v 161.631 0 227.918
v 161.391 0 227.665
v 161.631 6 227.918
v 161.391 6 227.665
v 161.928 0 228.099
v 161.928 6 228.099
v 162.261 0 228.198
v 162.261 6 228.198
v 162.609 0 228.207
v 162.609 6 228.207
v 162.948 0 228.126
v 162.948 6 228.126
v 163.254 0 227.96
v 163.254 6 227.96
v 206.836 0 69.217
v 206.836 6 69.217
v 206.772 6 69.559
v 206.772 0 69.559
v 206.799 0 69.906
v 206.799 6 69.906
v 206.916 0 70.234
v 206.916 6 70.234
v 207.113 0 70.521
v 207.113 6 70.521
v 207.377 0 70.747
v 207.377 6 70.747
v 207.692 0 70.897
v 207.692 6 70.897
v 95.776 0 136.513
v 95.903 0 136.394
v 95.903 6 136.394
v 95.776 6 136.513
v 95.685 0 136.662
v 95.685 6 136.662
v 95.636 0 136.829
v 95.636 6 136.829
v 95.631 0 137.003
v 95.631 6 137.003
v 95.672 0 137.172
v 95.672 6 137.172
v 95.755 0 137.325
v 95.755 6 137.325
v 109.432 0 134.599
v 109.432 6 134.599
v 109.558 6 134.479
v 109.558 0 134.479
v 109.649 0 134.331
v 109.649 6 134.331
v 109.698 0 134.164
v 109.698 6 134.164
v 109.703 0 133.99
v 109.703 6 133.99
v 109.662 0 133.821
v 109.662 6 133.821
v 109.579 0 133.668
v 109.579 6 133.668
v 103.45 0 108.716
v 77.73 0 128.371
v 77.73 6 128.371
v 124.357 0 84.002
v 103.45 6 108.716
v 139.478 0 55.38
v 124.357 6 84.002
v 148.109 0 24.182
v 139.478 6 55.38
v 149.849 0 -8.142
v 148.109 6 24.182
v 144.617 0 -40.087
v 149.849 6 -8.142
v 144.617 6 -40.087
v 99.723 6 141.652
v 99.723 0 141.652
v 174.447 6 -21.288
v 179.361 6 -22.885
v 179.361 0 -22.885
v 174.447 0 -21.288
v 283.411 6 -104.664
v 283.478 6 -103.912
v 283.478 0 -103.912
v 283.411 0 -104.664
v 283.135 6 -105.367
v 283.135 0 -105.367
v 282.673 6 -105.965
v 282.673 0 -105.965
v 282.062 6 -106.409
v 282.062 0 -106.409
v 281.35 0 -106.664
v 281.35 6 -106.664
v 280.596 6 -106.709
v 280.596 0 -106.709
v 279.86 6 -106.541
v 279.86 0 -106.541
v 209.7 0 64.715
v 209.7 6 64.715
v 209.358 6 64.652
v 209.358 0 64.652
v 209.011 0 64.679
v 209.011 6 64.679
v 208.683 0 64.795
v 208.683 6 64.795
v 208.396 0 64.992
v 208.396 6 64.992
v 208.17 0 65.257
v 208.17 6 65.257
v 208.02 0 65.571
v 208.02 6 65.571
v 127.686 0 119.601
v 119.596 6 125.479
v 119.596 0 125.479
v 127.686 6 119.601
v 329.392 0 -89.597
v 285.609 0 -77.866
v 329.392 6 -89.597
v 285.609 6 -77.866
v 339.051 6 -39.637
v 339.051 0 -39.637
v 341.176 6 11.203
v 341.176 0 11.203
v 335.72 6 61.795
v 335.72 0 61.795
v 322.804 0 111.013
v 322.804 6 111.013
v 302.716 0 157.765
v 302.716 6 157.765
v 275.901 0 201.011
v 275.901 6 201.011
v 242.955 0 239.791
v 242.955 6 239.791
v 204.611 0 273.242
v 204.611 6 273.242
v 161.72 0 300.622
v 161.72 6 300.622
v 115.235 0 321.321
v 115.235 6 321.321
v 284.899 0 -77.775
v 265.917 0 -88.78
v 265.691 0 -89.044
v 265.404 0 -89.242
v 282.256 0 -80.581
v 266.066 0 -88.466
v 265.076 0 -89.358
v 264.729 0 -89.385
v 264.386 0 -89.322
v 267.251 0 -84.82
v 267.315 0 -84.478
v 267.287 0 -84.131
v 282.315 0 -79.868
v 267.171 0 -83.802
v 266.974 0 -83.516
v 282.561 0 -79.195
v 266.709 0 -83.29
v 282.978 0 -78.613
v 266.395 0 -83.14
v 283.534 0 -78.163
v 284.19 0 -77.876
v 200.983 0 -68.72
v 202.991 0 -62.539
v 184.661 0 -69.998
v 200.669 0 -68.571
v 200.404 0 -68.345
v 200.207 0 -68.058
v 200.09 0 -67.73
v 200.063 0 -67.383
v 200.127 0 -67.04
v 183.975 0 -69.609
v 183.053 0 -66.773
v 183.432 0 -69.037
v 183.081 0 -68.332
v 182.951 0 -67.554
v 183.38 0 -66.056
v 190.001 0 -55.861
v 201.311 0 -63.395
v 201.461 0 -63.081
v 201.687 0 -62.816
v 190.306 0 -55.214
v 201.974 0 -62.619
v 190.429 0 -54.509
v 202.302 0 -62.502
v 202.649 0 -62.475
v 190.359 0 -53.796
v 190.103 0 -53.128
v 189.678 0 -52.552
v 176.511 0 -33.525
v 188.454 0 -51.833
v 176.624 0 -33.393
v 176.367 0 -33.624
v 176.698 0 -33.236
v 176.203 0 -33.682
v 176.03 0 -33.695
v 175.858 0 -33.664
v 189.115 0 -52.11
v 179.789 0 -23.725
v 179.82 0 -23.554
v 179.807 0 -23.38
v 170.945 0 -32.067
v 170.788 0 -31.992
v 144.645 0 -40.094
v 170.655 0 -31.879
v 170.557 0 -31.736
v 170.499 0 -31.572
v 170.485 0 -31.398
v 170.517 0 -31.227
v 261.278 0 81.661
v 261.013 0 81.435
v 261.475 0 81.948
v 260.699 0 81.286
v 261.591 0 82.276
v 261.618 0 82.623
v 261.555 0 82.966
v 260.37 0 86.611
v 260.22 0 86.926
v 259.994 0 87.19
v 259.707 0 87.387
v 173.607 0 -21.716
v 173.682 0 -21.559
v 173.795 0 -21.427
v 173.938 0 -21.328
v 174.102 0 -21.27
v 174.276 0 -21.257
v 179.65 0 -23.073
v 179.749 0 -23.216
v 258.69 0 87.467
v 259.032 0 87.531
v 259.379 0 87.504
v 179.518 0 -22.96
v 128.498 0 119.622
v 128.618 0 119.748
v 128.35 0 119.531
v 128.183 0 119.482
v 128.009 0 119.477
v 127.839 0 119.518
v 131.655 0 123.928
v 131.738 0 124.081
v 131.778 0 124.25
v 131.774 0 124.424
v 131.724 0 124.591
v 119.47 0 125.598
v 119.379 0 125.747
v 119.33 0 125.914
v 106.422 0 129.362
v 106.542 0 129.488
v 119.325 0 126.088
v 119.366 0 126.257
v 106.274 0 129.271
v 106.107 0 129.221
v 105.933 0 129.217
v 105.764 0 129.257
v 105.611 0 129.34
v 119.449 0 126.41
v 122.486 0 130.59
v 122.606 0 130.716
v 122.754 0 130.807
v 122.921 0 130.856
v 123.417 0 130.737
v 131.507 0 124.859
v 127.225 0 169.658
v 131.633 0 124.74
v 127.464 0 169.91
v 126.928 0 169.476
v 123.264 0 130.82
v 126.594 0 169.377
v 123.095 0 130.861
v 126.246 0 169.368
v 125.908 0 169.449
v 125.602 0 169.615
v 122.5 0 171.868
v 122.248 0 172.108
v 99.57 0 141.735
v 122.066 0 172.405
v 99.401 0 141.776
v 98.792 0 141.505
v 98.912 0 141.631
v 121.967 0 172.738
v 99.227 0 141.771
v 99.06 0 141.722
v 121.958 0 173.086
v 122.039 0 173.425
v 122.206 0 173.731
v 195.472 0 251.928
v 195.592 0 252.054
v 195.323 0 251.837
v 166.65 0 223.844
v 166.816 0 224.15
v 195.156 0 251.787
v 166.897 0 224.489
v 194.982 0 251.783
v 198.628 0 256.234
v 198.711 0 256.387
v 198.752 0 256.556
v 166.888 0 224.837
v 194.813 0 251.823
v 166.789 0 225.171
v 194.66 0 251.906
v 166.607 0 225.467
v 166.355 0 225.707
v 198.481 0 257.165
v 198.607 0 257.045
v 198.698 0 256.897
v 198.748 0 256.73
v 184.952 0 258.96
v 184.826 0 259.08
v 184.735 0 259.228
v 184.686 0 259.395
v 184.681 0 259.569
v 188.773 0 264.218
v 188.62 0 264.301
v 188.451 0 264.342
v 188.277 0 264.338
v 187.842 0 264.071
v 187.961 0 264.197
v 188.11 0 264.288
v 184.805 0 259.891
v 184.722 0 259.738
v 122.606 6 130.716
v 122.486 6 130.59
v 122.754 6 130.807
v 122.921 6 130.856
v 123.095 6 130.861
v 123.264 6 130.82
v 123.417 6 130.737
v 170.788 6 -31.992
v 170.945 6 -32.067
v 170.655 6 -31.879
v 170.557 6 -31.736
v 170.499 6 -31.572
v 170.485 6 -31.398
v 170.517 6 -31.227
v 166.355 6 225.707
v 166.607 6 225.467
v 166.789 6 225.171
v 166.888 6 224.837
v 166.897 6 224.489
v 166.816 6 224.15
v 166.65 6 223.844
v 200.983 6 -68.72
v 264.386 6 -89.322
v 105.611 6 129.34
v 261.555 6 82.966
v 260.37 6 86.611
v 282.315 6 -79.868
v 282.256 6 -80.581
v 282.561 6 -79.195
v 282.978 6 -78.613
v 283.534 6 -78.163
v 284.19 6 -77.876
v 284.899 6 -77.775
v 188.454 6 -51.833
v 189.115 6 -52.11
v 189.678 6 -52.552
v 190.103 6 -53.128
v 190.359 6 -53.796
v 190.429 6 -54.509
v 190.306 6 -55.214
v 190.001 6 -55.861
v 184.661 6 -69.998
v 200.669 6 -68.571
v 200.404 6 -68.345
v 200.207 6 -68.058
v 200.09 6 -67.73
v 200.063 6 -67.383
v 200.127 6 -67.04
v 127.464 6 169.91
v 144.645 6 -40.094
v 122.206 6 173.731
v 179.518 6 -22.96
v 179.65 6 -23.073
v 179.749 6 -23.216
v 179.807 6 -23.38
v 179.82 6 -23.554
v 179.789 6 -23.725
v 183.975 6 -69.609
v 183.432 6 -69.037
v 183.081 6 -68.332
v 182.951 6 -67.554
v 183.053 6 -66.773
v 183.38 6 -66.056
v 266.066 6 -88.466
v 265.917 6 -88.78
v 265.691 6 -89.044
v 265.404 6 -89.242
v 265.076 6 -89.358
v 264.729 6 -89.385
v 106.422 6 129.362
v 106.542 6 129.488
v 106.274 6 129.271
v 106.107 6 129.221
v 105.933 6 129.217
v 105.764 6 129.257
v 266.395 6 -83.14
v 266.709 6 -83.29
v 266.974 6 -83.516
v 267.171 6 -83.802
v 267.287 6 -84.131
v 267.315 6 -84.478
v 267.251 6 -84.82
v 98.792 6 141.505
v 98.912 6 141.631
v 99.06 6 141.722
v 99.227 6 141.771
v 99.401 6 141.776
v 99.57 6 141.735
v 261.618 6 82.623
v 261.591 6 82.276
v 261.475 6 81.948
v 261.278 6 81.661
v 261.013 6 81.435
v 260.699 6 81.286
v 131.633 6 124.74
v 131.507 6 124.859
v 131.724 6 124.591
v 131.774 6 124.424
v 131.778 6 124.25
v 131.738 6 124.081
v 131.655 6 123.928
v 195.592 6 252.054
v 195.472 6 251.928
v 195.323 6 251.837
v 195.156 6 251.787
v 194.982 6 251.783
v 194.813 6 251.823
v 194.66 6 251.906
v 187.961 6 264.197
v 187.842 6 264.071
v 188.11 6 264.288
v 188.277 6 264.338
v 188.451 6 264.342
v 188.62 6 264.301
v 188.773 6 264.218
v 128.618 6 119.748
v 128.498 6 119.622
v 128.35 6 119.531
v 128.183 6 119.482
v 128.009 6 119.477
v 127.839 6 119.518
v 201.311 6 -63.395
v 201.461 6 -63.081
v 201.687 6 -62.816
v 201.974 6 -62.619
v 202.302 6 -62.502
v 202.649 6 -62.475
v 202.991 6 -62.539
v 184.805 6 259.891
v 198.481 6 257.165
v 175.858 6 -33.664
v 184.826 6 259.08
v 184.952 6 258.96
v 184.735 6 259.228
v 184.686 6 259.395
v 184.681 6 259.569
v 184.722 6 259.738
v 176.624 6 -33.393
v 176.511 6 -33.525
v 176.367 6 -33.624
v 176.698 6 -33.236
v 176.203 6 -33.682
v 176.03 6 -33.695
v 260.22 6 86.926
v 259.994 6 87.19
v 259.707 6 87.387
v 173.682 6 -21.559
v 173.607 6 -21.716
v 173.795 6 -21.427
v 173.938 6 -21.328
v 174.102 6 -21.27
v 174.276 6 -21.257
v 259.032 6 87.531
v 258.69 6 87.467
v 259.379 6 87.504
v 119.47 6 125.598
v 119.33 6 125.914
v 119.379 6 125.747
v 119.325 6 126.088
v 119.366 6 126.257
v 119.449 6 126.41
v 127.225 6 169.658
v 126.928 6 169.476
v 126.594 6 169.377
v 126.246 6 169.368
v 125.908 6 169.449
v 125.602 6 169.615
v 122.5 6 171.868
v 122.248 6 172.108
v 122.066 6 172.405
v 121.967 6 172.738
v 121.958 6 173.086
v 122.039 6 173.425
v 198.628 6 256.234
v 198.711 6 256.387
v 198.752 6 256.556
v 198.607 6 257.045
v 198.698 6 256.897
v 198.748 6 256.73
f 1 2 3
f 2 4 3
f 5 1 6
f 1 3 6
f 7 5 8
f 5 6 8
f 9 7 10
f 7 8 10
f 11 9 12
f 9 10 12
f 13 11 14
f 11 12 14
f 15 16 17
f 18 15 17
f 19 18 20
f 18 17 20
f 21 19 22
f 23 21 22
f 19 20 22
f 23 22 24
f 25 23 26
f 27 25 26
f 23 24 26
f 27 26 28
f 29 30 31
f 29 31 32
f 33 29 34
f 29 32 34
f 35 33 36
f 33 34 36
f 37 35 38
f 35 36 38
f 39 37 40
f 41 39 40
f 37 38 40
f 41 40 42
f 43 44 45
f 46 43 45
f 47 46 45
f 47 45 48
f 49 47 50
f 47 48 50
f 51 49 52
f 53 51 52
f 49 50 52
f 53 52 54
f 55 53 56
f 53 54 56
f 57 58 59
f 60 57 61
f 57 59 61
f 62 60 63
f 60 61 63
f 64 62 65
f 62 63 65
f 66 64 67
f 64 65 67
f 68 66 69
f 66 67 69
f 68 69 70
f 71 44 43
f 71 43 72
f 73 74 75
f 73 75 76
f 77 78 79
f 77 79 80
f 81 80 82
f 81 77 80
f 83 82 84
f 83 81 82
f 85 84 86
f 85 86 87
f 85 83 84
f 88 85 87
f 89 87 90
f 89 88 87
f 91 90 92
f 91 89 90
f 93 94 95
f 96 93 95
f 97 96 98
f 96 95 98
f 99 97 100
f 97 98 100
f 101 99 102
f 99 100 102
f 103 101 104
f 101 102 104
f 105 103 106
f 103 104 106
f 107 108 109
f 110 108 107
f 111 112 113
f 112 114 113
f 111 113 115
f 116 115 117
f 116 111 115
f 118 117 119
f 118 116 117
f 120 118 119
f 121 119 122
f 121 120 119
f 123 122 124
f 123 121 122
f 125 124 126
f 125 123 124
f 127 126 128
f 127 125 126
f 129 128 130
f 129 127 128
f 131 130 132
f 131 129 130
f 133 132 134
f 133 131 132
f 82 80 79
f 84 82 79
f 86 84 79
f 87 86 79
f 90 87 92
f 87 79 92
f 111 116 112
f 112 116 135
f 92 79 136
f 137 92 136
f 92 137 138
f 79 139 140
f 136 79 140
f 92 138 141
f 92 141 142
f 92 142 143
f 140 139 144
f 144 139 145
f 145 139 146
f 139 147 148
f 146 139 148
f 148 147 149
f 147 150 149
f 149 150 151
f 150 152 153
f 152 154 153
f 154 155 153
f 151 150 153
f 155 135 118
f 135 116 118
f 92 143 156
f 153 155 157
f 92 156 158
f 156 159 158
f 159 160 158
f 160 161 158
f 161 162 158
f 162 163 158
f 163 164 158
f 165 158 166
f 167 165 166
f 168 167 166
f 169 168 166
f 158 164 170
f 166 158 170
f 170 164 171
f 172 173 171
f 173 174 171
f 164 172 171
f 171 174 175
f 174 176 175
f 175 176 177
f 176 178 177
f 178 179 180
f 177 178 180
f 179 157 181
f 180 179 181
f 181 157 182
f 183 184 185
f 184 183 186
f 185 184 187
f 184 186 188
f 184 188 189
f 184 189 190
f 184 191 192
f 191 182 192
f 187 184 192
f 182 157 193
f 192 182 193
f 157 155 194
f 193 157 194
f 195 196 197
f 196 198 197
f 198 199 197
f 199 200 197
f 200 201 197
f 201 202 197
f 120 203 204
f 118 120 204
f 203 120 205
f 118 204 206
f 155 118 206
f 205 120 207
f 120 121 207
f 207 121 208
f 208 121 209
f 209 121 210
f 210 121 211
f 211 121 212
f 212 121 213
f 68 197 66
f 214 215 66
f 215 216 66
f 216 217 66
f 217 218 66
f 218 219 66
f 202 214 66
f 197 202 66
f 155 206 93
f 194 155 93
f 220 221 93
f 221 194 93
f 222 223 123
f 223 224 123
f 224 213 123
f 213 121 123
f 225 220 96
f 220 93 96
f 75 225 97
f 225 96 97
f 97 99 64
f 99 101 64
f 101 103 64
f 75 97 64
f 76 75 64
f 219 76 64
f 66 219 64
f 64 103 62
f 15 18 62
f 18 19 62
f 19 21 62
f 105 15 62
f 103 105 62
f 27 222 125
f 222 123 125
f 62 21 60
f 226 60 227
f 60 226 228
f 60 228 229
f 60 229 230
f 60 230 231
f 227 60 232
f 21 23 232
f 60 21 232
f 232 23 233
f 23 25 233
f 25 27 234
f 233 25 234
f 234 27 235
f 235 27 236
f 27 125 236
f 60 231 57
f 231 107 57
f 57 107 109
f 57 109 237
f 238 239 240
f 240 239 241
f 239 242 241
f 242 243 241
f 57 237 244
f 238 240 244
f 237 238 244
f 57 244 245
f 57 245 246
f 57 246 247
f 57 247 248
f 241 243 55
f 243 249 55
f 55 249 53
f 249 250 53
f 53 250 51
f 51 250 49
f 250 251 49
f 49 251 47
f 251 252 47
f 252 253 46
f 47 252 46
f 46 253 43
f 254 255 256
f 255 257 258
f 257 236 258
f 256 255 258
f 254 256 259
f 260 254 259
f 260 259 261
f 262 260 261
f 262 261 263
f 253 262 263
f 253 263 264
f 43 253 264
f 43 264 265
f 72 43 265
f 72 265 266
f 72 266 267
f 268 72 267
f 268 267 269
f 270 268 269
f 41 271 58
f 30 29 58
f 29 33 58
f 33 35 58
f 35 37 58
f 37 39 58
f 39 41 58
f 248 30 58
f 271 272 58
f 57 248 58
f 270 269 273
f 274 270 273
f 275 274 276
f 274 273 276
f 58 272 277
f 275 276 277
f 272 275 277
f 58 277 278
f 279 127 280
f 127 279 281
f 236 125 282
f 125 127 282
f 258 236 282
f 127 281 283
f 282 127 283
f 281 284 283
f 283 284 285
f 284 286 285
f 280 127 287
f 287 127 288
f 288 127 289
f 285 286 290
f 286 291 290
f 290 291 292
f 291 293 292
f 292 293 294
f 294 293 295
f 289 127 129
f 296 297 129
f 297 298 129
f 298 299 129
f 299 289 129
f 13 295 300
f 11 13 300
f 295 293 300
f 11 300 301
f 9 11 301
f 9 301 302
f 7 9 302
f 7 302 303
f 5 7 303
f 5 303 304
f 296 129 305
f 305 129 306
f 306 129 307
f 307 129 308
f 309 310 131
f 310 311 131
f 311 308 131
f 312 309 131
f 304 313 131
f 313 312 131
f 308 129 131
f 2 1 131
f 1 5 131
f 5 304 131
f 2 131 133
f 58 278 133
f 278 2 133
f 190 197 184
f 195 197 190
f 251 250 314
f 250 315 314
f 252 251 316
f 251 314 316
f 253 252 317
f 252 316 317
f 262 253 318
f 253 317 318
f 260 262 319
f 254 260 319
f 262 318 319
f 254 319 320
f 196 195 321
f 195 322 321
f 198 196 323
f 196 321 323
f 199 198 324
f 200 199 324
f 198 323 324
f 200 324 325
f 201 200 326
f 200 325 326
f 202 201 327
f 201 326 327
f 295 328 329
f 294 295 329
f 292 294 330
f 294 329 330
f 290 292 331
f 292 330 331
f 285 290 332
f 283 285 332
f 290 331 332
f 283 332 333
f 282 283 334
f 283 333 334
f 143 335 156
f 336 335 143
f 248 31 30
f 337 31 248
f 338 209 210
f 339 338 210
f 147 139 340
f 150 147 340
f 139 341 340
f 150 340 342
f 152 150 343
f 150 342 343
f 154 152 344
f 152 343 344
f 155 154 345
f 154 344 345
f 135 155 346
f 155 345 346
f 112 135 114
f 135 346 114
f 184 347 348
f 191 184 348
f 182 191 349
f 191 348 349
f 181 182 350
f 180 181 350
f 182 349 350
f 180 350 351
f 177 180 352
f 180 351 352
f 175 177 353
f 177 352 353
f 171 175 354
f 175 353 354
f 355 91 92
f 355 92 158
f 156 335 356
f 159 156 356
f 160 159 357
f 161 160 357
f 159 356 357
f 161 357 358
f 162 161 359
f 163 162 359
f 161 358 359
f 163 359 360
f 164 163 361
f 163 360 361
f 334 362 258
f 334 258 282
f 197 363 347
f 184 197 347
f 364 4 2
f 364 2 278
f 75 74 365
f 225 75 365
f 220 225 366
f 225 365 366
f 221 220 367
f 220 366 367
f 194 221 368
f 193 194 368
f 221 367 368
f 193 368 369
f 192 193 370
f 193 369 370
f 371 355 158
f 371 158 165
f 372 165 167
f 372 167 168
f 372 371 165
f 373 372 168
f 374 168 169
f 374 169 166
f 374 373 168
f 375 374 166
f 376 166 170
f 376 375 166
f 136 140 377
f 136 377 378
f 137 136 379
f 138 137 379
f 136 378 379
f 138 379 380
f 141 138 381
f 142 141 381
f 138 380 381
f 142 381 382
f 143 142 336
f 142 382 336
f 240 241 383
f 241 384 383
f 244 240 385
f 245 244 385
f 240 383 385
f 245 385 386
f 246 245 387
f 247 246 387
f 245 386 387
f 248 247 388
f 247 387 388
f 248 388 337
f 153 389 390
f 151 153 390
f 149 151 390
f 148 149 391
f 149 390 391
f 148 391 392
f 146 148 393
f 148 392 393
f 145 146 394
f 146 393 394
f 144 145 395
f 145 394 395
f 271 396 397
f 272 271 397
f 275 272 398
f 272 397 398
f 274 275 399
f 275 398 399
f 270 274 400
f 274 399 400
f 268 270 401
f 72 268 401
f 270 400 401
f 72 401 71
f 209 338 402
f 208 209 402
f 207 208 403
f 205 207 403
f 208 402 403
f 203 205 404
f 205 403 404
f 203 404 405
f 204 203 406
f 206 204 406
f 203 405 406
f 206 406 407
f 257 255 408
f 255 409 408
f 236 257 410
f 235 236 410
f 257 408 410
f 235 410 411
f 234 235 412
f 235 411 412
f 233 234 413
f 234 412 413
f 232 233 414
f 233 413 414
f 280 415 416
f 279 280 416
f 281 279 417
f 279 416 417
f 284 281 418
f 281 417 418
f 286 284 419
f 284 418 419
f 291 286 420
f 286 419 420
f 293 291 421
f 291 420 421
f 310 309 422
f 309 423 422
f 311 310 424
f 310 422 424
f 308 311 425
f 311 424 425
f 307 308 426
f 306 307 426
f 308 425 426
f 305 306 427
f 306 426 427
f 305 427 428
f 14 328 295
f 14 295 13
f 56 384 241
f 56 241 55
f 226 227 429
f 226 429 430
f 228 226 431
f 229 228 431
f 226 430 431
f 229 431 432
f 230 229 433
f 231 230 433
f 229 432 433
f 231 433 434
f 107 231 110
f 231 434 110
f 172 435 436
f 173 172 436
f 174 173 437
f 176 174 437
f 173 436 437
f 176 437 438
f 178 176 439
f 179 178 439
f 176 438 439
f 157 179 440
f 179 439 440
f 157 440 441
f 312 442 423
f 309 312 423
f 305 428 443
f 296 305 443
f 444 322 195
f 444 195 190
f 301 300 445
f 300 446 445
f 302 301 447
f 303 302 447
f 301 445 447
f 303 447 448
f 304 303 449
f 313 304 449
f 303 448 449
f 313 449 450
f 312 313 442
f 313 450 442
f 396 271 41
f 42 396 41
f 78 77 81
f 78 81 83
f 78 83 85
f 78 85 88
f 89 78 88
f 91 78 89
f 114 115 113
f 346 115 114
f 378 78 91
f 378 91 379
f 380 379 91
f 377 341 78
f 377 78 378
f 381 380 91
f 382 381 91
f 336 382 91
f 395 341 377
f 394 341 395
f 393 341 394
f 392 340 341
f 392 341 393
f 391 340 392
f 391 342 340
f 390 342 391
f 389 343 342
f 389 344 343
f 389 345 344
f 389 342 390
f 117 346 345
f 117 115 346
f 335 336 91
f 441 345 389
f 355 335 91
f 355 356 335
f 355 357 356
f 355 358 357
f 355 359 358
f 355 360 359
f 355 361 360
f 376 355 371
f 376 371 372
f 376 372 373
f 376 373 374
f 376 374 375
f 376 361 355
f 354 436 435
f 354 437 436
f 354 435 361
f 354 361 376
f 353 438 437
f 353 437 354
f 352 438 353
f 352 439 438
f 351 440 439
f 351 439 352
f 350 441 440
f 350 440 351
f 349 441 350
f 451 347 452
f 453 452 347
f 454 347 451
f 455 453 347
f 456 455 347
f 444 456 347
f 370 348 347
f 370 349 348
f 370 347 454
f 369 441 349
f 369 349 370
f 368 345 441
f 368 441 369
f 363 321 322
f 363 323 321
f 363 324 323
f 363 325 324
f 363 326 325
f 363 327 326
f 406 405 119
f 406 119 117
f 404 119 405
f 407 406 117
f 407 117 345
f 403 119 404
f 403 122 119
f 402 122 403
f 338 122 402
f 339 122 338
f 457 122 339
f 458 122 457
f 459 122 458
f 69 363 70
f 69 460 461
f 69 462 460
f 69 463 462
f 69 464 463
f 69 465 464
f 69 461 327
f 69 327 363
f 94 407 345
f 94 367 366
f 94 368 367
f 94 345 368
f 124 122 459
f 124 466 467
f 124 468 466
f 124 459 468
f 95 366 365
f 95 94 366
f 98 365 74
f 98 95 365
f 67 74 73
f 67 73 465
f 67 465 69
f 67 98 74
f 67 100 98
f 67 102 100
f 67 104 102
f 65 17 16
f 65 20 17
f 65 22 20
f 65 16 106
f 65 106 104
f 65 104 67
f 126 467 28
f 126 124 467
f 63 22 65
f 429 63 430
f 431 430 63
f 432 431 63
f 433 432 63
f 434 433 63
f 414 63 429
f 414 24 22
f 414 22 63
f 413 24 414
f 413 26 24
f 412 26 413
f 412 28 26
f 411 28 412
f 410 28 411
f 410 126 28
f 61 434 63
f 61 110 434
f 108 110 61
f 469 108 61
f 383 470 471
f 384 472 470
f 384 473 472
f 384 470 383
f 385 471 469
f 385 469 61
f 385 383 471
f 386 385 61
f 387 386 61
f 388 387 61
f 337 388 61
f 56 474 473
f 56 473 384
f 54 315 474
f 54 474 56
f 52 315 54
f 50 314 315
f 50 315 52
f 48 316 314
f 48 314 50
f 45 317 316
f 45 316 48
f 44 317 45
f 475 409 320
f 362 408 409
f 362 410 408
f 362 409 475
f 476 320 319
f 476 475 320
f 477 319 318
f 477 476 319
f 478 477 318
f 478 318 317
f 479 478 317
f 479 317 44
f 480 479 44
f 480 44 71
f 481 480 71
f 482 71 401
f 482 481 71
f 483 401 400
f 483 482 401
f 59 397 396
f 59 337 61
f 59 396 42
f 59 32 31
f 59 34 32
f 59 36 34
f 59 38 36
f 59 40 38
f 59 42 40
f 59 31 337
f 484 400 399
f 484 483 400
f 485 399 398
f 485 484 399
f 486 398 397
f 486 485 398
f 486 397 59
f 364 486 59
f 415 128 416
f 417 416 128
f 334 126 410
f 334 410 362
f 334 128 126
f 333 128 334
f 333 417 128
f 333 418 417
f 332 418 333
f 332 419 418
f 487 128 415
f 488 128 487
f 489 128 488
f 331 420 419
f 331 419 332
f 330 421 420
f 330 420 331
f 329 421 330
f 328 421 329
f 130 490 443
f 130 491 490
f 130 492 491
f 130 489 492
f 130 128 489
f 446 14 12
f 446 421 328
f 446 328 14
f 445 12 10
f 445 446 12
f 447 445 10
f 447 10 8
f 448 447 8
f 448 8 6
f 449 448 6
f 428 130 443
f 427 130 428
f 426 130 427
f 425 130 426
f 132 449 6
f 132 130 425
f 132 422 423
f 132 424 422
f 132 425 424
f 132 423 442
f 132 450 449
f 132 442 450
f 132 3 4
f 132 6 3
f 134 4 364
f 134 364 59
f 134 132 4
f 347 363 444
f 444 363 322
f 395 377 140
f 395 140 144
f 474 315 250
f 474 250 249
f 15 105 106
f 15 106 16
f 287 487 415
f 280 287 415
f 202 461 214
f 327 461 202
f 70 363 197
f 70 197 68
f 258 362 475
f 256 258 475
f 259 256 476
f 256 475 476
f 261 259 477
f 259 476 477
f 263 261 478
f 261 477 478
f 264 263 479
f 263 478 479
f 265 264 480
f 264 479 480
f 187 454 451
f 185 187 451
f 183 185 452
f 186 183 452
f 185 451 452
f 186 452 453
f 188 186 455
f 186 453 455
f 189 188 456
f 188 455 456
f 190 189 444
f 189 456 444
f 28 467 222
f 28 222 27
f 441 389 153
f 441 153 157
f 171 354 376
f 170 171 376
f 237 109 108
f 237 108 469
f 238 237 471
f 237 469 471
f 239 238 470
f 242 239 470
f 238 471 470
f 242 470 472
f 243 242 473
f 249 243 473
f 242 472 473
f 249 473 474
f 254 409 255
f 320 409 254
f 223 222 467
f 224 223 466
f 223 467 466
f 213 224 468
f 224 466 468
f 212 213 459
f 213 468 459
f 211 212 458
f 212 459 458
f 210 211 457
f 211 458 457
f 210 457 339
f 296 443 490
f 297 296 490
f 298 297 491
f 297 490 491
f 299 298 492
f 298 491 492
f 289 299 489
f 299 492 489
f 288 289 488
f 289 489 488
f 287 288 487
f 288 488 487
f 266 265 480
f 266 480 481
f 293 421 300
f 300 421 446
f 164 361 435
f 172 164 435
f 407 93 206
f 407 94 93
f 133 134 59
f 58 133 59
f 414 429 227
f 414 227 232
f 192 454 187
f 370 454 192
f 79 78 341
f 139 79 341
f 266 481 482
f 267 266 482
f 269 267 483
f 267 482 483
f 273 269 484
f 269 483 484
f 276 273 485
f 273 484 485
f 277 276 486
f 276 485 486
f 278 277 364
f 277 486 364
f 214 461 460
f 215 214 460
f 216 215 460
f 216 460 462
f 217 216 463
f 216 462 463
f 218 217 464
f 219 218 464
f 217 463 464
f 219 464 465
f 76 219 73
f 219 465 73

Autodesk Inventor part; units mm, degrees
ref_plane "YZ Plane" through (0, 0, 0) normal (1, 0, 0) x (0, 1, 0)
ref_plane "XZ Plane" through (0, 0, 0) normal (0, 1, 0) x (-1, 0, 0)
sketch "Sketch1" plane through (0, 0, 0) normal (0, 1, 0) x (-1, 0, 0)
  circle A0 centre (0, 0) radius 341.36
  circle A1 centre (0, 0) radius 150.07
  dimension "d84" = 300.14
  dimension "d85" = 682.72
extrude "Extrusion3" add sketch "Sketch1" along normal blind 6 contours A0 | A1
sketch "Sketch2" plane through (0, 6, 0) normal (0, 1, 0) x (1, 0, 0)
  circle A0 centre (0, 0) radius 245.715 construction
  line L0 (245.7148, 0.3131) -> (341.6521, -0.0088)
  line L1 (-0.6289, 279.0483) -> (-0.0524, 279.0483)
  line L2 (3.25, 279.0483) -> (3.25, 212.3817)
  line L3 (0.5377, 212.3817) -> (-0.051, 212.3817)
  line L4 (-3.25, 212.3817) -> (-3.25, 279.0483)
  arc A1 (-3.25, 212.3817) -> (-1.9167, 211.0483) centre (-1.9167, 212.3817) ccw
  arc A2 (1.9167, 211.0483) -> (3.25, 212.3817) centre (1.9167, 212.3817) ccw
  arc A3 (-1.9167, 280.3817) -> (-3.25, 279.0483) centre (-1.9167, 279.0483) ccw
  arc A4 (3.25, 279.0483) -> (1.9167, 280.3817) centre (1.9167, 279.0483) ccw
  line L5 (-1.9167, 280.3817) -> (1.9167, 280.3817)
  line L6 (-1.9167, 211.0483) -> (1.9167, 211.0483)
  line L7 (0, 0) -> (0, 212.3817)
  line L8 (0, 280.3817) -> (0, 341.36)
  line L9 (0, 211.0483) -> (0, 245.715) construction
  line L10 (0, 280.3817) -> (0, 245.715) construction
  arc A5 (-157.4948, 221.8428) -> (-159.3572, 222.1378) centre (-158.5735, 221.0591) ccw
  line L11 (-162.4585, 219.8846) -> (-159.3572, 222.1378)
  arc A6 (-162.4585, 219.8846) -> (-162.7534, 218.0222) centre (-161.6748, 218.8059) ccw
  line L12 (-160.9079, 221.0112) -> (-144.3647, 198.2416) construction
  line L13 (-160.633, 219.5628) -> (-160.1666, 219.9017)
  line L14 (-157.4948, 221.8428) -> (-125.976, 178.4609)
  line L15 (-131.2346, 174.6403) -> (-162.7534, 218.0222)
  line L16 (-127.8216, 175.4719) -> (-144.3647, 198.2416) construction
  line L17 (-128.1703, 176.8667) -> (-128.6466, 176.5206)
  arc A7 (-126.271, 176.5985) -> (-125.976, 178.4609) centre (-127.0547, 177.6772) ccw
  line L18 (-129.3722, 174.3453) -> (-126.271, 176.5985)
  arc A8 (-131.2346, 174.6403) -> (-129.3722, 174.3453) centre (-130.156, 175.424) ccw
  arc A9 (-259.6684, -81.8575) -> (-260.5244, -83.5376) centre (-259.2564, -83.1256) ccw
  line L19 (-259.3399, -87.1834) -> (-260.5244, -83.5376)
  arc A10 (-259.3399, -87.1834) -> (-257.6598, -88.0394) centre (-258.0718, -86.7713) ccw
  line L20 (-259.9321, -85.3605) -> (-233.1648, -76.6633) construction
  line L21 (-258.4697, -85.5466) -> (-258.6479, -84.9983)
  line L22 (-259.6684, -81.8575) -> (-208.6699, -65.2871)
  line L23 (-206.6613, -71.469) -> (-257.6598, -88.0394)
  line L24 (-206.3975, -67.966) -> (-233.1648, -76.6633) construction
  line L25 (-207.8317, -67.8666) -> (-207.6498, -68.4265)
  arc A11 (-206.9898, -66.1432) -> (-208.6699, -65.2871) centre (-208.2578, -66.5552) ccw
  line L26 (-205.8052, -69.7889) -> (-206.9898, -66.1432)
  arc A12 (-206.6613, -71.469) -> (-205.8052, -69.7889) centre (-207.0733, -70.2009) ccw
  arc A13 (258.6901, -87.4674) -> (260.3702, -86.6114) centre (259.1021, -86.1993) ccw
  line L27 (261.5548, -82.9657) -> (260.3702, -86.6114)
  arc A14 (261.5548, -82.9657) -> (260.6987, -81.2856) centre (260.2867, -82.5536) ccw
  line L28 (260.9625, -84.7885) -> (234.1951, -76.0913) construction
  line L29 (259.8887, -83.7783) -> (259.7106, -84.3266)
  line L30 (258.6901, -87.4674) -> (207.6916, -70.897)
  line L31 (209.7002, -64.7151) -> (260.6987, -81.2856)
  line L32 (207.4278, -67.394) -> (234.1951, -76.0913) construction
  line L33 (208.5297, -68.3175) -> (208.7116, -67.7576)
  arc A15 (206.8355, -69.2169) -> (207.6916, -70.897) centre (208.1036, -69.6289) ccw
  line L34 (208.0201, -65.5712) -> (206.8355, -69.2169)
  arc A16 (209.7002, -64.7151) -> (208.0201, -65.5712) centre (209.2882, -65.9832) ccw
  arc A17 (162.9147, 218.5186) -> (162.6198, 220.381) centre (161.836, 219.3023) ccw
  line L35 (159.5185, 222.6342) -> (162.6198, 220.381)
  arc A18 (159.5185, 222.6342) -> (157.6561, 222.3392) centre (158.7348, 221.5555) ccw
  line L36 (161.0691, 221.5076) -> (144.526, 198.7379) construction
  line L37 (159.7766, 220.7986) -> (160.243, 220.4597)
  line L38 (162.9147, 218.5186) -> (131.3959, 175.1367)
  line L39 (126.1373, 178.9573) -> (157.6561, 222.3392)
  line L40 (127.9829, 175.9683) -> (144.526, 198.7379) construction
  line L41 (129.2017, 176.7309) -> (128.7254, 177.0769)
  arc A19 (129.5335, 174.8417) -> (131.3959, 175.1367) centre (130.3172, 175.9204) ccw
  line L42 (126.4323, 177.0949) -> (129.5335, 174.8417)
  arc A20 (126.1373, 178.9573) -> (126.4323, 177.0949) centre (127.216, 178.1736) ccw
  line L43 (-265.5851, 85.6325) -> (-265.4069, 86.1808)
  line L44 (-267.2511, 84.8198) -> (-266.0665, 88.4656)
  line L45 (-201.3112, 63.3947) -> (-200.1266, 67.0404)
  arc A21 (-267.2511, 84.8198) -> (-266.395, 83.1397) centre (-265.983, 84.4078) ccw
  arc A22 (-264.3864, 89.3216) -> (-266.0665, 88.4656) centre (-264.7985, 88.0535) ccw
  line L46 (-266.6588, 86.6427) -> (-233.6889, 75.9301) construction
  line L47 (-202.9913, 62.5386) -> (-266.395, 83.1397)
  line L48 (-264.3864, 89.3216) -> (-200.9827, 68.7205)
  line L49 (-200.7189, 65.2175) -> (-233.6889, 75.9301) construction
  arc A23 (-202.9913, 62.5386) -> (-201.3112, 63.3947) centre (-202.5793, 63.8067) ccw
  arc A24 (-200.1266, 67.0404) -> (-200.9827, 68.7205) centre (-201.3947, 67.4524) ccw
  line L50 (-201.8208, 66.141) -> (-202.0027, 65.5811)
  line L51 (-163.5117, -226.1245) -> (-163.9781, -225.7857)
  line L52 (-163.2536, -227.9601) -> (-166.3548, -225.7069)
  line L53 (-122.5005, -171.8683) -> (-125.6017, -169.6151)
  arc A25 (-163.2536, -227.9601) -> (-161.3912, -227.6651) centre (-162.4699, -226.8814) ccw
  arc A26 (-166.6498, -223.8445) -> (-166.3548, -225.7069) centre (-165.5711, -224.6283) ccw
  line L54 (-164.8042, -226.8335) -> (-144.4277, -198.7876) construction
  line L55 (-122.2055, -173.7307) -> (-161.3912, -227.6651)
  line L56 (-166.6498, -223.8445) -> (-127.4641, -169.9101)
  line L57 (-124.0511, -170.7417) -> (-144.4277, -198.7876) construction
  arc A27 (-122.2055, -173.7307) -> (-122.5005, -171.8683) centre (-123.2842, -172.947) ccw
  arc A28 (-125.6017, -169.6151) -> (-127.4641, -169.9101) centre (-126.3854, -170.6938) ccw
  line L58 (-125.2699, -171.5043) -> (-124.7936, -171.8503)
  line L59 (164.5293, -225.3852) -> (164.0629, -225.724)
  line L60 (166.3548, -225.7069) -> (163.2536, -227.9601)
  line L61 (125.6017, -169.6151) -> (122.5005, -171.8683)
  arc A29 (166.3548, -225.7069) -> (166.6498, -223.8445) centre (165.5711, -224.6283) ccw
  arc A30 (161.3912, -227.6651) -> (163.2536, -227.9601) centre (162.4699, -226.8814) ccw
  line L62 (164.8042, -226.8335) -> (144.4277, -198.7876) construction
  line L63 (127.4641, -169.9101) -> (166.6498, -223.8445)
  line L64 (161.3912, -227.6651) -> (122.2055, -173.7307)
  line L65 (124.0511, -170.7417) -> (144.4277, -198.7876) construction
  arc A31 (127.4641, -169.9101) -> (125.6017, -169.6151) centre (126.3854, -170.6938) ccw
  arc A32 (122.5005, -171.8683) -> (122.2055, -173.7307) centre (123.2842, -172.947) ccw
  line L66 (124.3998, -172.1365) -> (124.8761, -171.7904)
  line L67 (265.1964, 86.8288) -> (265.3745, 86.2805)
  line L68 (266.0665, 88.4656) -> (267.2511, 84.8198)
  line L69 (200.1266, 67.0404) -> (201.3112, 63.3947)
  arc A33 (266.0665, 88.4656) -> (264.3864, 89.3216) centre (264.7985, 88.0535) ccw
  arc A34 (266.395, 83.1397) -> (267.2511, 84.8198) centre (265.983, 84.4078) ccw
  line L70 (266.6588, 86.6427) -> (233.6889, 75.9301) construction
  line L71 (200.9827, 68.7205) -> (264.3864, 89.3216)
  line L72 (266.395, 83.1397) -> (202.9913, 62.5386)
  line L73 (200.7189, 65.2175) -> (233.6889, 75.9301) construction
  arc A35 (200.9827, 68.7205) -> (200.1266, 67.0404) centre (201.3947, 67.4524) ccw
  arc A36 (201.3112, 63.3947) -> (202.9913, 62.5386) centre (202.5793, 63.8067) ccw
  line L74 (202.1531, 65.1181) -> (201.9712, 65.678)
  line L75 (236.8664, -101.279) -> (236.7913, -101.5102)
  point P0 (-128.6053, 176.5506)
  point P1 (-207.6656, -68.3781)
  point P2 (208.6959, -67.8061)
  point P3 (128.7666, 177.047)
  point P4 (-201.987, 65.6295)
  point P5 (-124.8348, -171.8204)
  point P6 (124.8348, -171.8204)
  point P7 (201.987, 65.6295)
  dimension "d21" = 6.5
  dimension "d23" = 66.6667
  dimension "d24" = 2.6667
  dimension "d25" = 2.6667
  dimension "d32" = 1.3333
  dimension "d33" = 1.3333
  dimension "d41" = 90
  dimension "d42" = 3.25
  dimension "d43" = 90
  dimension "d49" = 360
  dimension "d86" = 491.43
  dimension "d96" = 0.243
extrude "Extrusion4" cut sketch "Sketch2" against normal through all
sketch "Sketch3" plane through (0, 6, 0) normal (0, 1, 0) x (1, 0, 0)
  arc A0 (-115.2299, -321.3234) -> (115.2355, -321.3214) centre (0, 0) ccw
  arc A1 (-77.7244, -128.3741) -> (77.7297, -128.3709) centre (0, 0) ccw
  line L0 (-122.1811, -173.696) -> (-161.3589, -227.6196)
  line L1 (-115.2299, -321.3234) -> (-77.7244, -128.3741)
  line L2 (0, 0) -> (0, -341.2918)
  line L3 (115.2355, -321.3214) -> (77.7297, -128.3709)
  line L4 (161.3912, -227.6651) -> (122.2055, -173.7307) projected
  dimension "d52" = 25
  dimension "d87" = 150.07
  dimension "d88" = 341.36
  dimension "d89" = 25
  dimension "d90" = 11
  dimension "d91" = 11
extrude "Extrusion5" cut sketch "Sketch3" against normal blind 10
sketch "Sketch5" plane through (0, 6, 0) normal (0, 1, 0) x (1, 0, 0)
  line L0 (3.25, 279.0483) -> (3.25, 212.3817) projected
  line L1 (5.5862, 197.9634) -> (-6.155, 194.8174)
  line L2 (-11.2263, 301.7146) -> (10.5847, 293.3421)
  line L3 (6.5657, 149.9554) -> (8.9394, 195.248)
  line L4 (14.2034, 295.6921) -> (16.5771, 340.9846)
  arc A0 (10.5847, 293.3421) -> (14.2034, 295.6921) centre (11.5404, 295.8316) ccw
  arc A1 (8.9394, 195.248) -> (5.5862, 197.9634) centre (6.2763, 195.3876) ccw
  arc A2 (-11.2263, 301.7146) -> (-14.8449, 299.0854) centre (-12.1819, 299.225) ccw
  line L5 (-3.25, 212.3817) -> (-3.25, 279.0483) projected
  line L6 (-14.8449, 299.0854) -> (-9.5081, 197.2536)
  arc A3 (-9.5081, 197.2536) -> (-6.155, 194.8174) centre (-6.8451, 197.3932) ccw
  line L7 (-1.9167, 211.0483) -> (1.9167, 211.0483) projected
  line L8 (1.9167, 280.3817) -> (-1.9167, 280.3817) projected
  arc A4 (115.2355, -321.3214) -> (-115.2299, -321.3234) centre (0, 0) ccw
  line L9 (16.5771, 340.9846) -> (16.5774, 340.9903)
  arc A5 (-190.5375, 51.9119) -> (-187.1843, 54.3482) centre (-189.8473, 54.4877) ccw
  line L10 (-186.5481, 66.4868) -> (-187.1843, 54.3482)
  arc A6 (-182.9295, 68.8368) -> (-186.5481, 66.4868) centre (-183.8851, 66.3472) ccw
  arc A7 (-275.714, 100.7144) -> (-276.8308, 104.8821) centre (-277.7864, 102.3926) ccw
  line L11 (-289.0345, 78.3041) -> (-190.5375, 51.9119)
  arc A8 (-290.4167, 82.5581) -> (-289.0345, 78.3041) centre (-288.3443, 80.8799) ccw
  line L12 (-290.4167, 82.5581) -> (-275.714, 100.7144)
  line L13 (-276.8308, 104.8821) -> (-319.1731, 121.1358)
  line L14 (-140.5872, 52.5831) -> (-182.9295, 68.8368)
  line L15 (-319.1731, 121.1358) -> (-319.1784, 121.1378)
  arc A9 (184.6611, 69.9975) -> (183.3803, 66.0556) centre (185.6168, 67.508) ccw
  line L16 (190.0006, 55.8613) -> (183.3803, 66.0556)
  arc A10 (188.4543, 51.8331) -> (190.0006, 55.8613) centre (187.7641, 54.4089) ccw
  arc A11 (282.2558, 80.581) -> (285.609, 77.8656) centre (284.9188, 80.4414) ccw
  line L17 (279.8598, 106.5409) -> (184.6611, 69.9975)
  arc A12 (283.4785, 103.9117) -> (279.8598, 106.5409) centre (280.8155, 104.0513) ccw
  line L18 (283.4785, 103.9117) -> (282.2558, 80.581)
  line L19 (285.609, 77.8656) -> (329.4183, 89.6043)
  line L20 (144.645, 40.0945) -> (188.4543, 51.8331)
  line L21 (329.4183, 89.6043) -> (329.4238, 89.6058)
  circle A13 centre (0, 0) radius 150.07
  line L22 (-140.5872, 52.5831) -> (-140.5479, 52.568)
  line L23 (144.645, 40.0945) -> (144.5122, 40.0589)
  line L24 (6.5657, 149.9554) -> (6.5621, 149.8874)
  arc A14 (-77.7244, -128.3741) -> (77.7297, -128.3709) centre (0, 0) ccw projected
  arc A15 (115.2355, -321.3214) -> (-115.2299, -321.3234) centre (0, 0) ccw projected
  line L25 (77.7297, -128.3709) -> (115.2355, -321.3214)
  line L26 (-77.7244, -128.3741) -> (-115.2299, -321.3234)
  point P0 (-77.7399, -128.3998)
  point P1 (77.7399, -128.3998)
  point P2 (-319.1475, 121.126)
  point P3 (-140.56, 52.5727)
  point P4 (6.5642, 149.9264)
  point P5 (16.5757, 340.9573)
  point P6 (329.3918, 89.5972)
  point P7 (144.6169, 40.0869)
  dimension "d63" = 2.6667
  dimension "d64" = 3
  dimension "d66" = 3
  dimension "d67" = 2.6667
  dimension "d68" = 2.6667
  dimension "d70" = 72
  dimension "d71" = 72
  dimension "d94" = 300.14
  dimension "d95" = 682.72
sketch "Sketch6" plane through (0, 6, 0) normal (0, 1, 0) x (1, 0, 0)
  line L0 (188.7727, -264.2184) -> (198.4809, -257.165)
  line L1 (194.6603, -251.9064) -> (184.9521, -258.9598)
  line L2 (161.3912, -227.6651) -> (122.2055, -173.7307) projected
  line L3 (166.3548, -225.7069) -> (163.2536, -227.9601) projected
  arc A0 (195.5915, -252.0539) -> (194.6603, -251.9064) centre (195.0522, -252.4457) ccw
  arc A1 (198.4809, -257.165) -> (198.6284, -256.2338) centre (198.0891, -256.6256) ccw
  arc A2 (187.8415, -264.0709) -> (188.7727, -264.2184) centre (188.3809, -263.6791) ccw
  arc A3 (184.9521, -258.9598) -> (184.8046, -259.891) centre (185.344, -259.4991) ccw
  line L4 (184.8046, -259.891) -> (187.8415, -264.0709)
  line L5 (198.6284, -256.2338) -> (195.5915, -252.0539)
  line L6 (122.2055, -173.7307) -> (161.3912, -227.6651) projected
  line L7 (141.7983, -200.6979) -> (147.057, -196.8773)
  line L8 (166.6498, -223.8445) -> (127.4641, -169.9101) projected
  line L9 (95.9027, -136.3937) -> (105.6109, -129.3403)
  line L10 (109.4315, -134.5989) -> (99.7233, -141.6523)
  arc A4 (109.4315, -134.5989) -> (109.579, -133.6677) centre (109.0396, -134.0596) ccw
  arc A5 (106.5421, -129.4878) -> (105.6109, -129.3403) centre (106.0027, -129.8796) ccw
  arc A6 (95.9027, -136.3937) -> (95.7552, -137.3249) centre (96.2945, -136.9331) ccw
  arc A7 (98.7921, -141.5048) -> (99.7233, -141.6523) centre (99.3314, -141.113) ccw
  line L11 (98.7921, -141.5048) -> (95.7552, -137.3249)
  line L12 (106.5421, -129.4878) -> (109.579, -133.6677)
  point P0 (0, 0)
  dimension "d104" = 6.5
  dimension "d105" = 12
  dimension "d108" = 1.3333
  dimension "d109" = 1.3333
  dimension "d110" = 1.3333
  dimension "d111" = 1.3333
  dimension "d112" = 0
  dimension "d149" = 145
  dimension "d150" = 90
  dimension "d151" = 90
  dimension "d152" = 90
  dimension "d153" = 90
extrude "Extrusion7" cut sketch "Sketch6" against normal through all
sketch "Sketch7" plane through (0, 6, 0) normal (0, 1, 0) x (1, 0, 0)
  line L0 (119.5964, -125.4786) -> (127.6865, -119.6008)
  line L1 (106.4838, -136.3528) -> (96.7756, -143.4062)
  line L2 (128.6177, -119.7483) -> (131.6546, -123.9282)
  line L3 (131.5071, -124.8594) -> (123.417, -130.7373)
  line L4 (122.4858, -130.5898) -> (119.4489, -126.4098)
  line L5 (103.5944, -131.2417) -> (106.6313, -135.4216)
  arc A0 (119.5964, -125.4786) -> (119.4489, -126.4098) centre (119.9882, -126.018) ccw
  arc A1 (122.4858, -130.5898) -> (123.417, -130.7373) centre (123.0251, -130.1979) ccw
  arc A2 (128.6177, -119.7483) -> (127.6865, -119.6008) centre (128.0784, -120.1401) ccw
  arc A3 (131.5071, -124.8594) -> (131.6546, -123.9282) centre (131.1153, -124.3201) ccw
  line L6 (173.6068, 21.7165) -> (170.5167, 31.227)
  line L7 (170.9447, 32.0671) -> (175.8585, 33.6637)
  line L8 (176.6985, 33.2357) -> (179.7887, 23.7251)
  line L9 (179.3607, 22.885) -> (174.4469, 21.2885)
  arc A4 (173.6068, 21.7165) -> (174.4469, 21.2885) centre (174.2409, 21.9225) ccw
  arc A5 (179.3607, 22.885) -> (179.7887, 23.7251) centre (179.1547, 23.5191) ccw
  arc A6 (170.9447, 32.0671) -> (170.5167, 31.227) centre (171.1507, 31.4331) ccw
  arc A7 (176.6985, 33.2357) -> (175.8585, 33.6637) centre (176.0645, 33.0296) ccw
  line L10 (188.4543, 51.8331) -> (144.6169, 40.0869) projected
  line L11 (201.3112, 63.3947) -> (200.1266, 67.0404) projected
  line L12 (179.8921, 12.7927) -> (180.0981, 12.1586)
  line L13 (183.5904, 29.3861) -> (183.8471, 29.4696)
  point P0 (0, 0)
  dimension "d116" = 1.3333
  dimension "d117" = 1.3333
  dimension "d119" = 1.3333
  dimension "d120" = 1.3333
  dimension "d121" = 6.5
  dimension "d122" = 10
  dimension "d126" = 1.09
  dimension "d127" = 16.3333
  dimension "d128" = 1.3333
  dimension "d129" = 1.3333
  dimension "d130" = 1.3333
  dimension "d131" = 1.3333
  dimension "d132" = 6.5
  dimension "d133" = 10
  dimension "d135" = 3
  dimension "d140" = 0.6667
  dimension "d148" = 0.27
extrude "Extrusion8" cut sketch "Sketch7" against normal through all contours L0 A2 L2 A3 L3 A1 L4 A0
extrude "Extrusion9" cut sketch "Sketch7" against normal through all contours L6 A6 L7 A7 L8 A5 L9 A4
ref_plane "Work Plane1" through (265.3907, 0, -86.2307) normal (0.309, 0, 0.9511) x (0.9511, 0, -0.309)
mirror "Mirror2" about plane through (265.3907, 0, -86.2307) normal (0.309, 0, 0.9511) of "Extrusion9"
mirror "Mirror1" about plane through (0, 0, 0) normal (1, 0, 0) of "Extrusion8", "Extrusion9", "Mirror2"
pattern_circular "Circular Pattern1" count 2 over 72 about axis through (0, -10, 0) along (0, 1, 0) of "Extrusion9", "Mirror2"
pattern_circular "Circular Pattern2" count 2 over 72 about axis through (0, -10, 0) along (0, 1, 0) of "Extrusion7"
pattern_circular "Circular Pattern3" count 2 over 144 about axis through (0, -10, 0) along (0, 1, 0) of "Extrusion7"
mirror "Mirror3" about plane through (0, 0, 0) normal (1, 0, 0) of "Extrusion7", "Circular Pattern2"
extrude "Extrusion10" cut sketch "Sketch5" against normal through all contours A1 L3 L24 A13 L22 L14 A6 L10 A5 L11 A8 L12 A7 L13 A4 L4 A0 L2 A2 L6 A3 L1 | L1 A3 L6 A2 L2 A0 L4 A4 L19 A11 L18 A12 L17 A9 L16 A10 L20 L23 A13 L24 L3 A1 | A13 | A13 L26 A4 L13 A7 L12 A8 L11 A5 L10 A6 L14 L22
equation "\"BendRadius\" = Thickness"
equation "\"BendReliefWidth\" = Thickness"
equation "\"BendReliefDepth\" = 0.5 * Thickness"
equation "\"CornerReliefSize\" = 4 * Thickness"
equation "\"MinimumRemnant\" = 2 * Thickness"
equation "\"TransitionRadius\" = BendRadius"
equation "\"JacobiRadiusSize\" = BendRadius"
equation "\"GapSize\" = Thickness"
equation "\"Thickness\" = 0.5"
properties part number "Ring B-4" material "Wood (Maple)"
